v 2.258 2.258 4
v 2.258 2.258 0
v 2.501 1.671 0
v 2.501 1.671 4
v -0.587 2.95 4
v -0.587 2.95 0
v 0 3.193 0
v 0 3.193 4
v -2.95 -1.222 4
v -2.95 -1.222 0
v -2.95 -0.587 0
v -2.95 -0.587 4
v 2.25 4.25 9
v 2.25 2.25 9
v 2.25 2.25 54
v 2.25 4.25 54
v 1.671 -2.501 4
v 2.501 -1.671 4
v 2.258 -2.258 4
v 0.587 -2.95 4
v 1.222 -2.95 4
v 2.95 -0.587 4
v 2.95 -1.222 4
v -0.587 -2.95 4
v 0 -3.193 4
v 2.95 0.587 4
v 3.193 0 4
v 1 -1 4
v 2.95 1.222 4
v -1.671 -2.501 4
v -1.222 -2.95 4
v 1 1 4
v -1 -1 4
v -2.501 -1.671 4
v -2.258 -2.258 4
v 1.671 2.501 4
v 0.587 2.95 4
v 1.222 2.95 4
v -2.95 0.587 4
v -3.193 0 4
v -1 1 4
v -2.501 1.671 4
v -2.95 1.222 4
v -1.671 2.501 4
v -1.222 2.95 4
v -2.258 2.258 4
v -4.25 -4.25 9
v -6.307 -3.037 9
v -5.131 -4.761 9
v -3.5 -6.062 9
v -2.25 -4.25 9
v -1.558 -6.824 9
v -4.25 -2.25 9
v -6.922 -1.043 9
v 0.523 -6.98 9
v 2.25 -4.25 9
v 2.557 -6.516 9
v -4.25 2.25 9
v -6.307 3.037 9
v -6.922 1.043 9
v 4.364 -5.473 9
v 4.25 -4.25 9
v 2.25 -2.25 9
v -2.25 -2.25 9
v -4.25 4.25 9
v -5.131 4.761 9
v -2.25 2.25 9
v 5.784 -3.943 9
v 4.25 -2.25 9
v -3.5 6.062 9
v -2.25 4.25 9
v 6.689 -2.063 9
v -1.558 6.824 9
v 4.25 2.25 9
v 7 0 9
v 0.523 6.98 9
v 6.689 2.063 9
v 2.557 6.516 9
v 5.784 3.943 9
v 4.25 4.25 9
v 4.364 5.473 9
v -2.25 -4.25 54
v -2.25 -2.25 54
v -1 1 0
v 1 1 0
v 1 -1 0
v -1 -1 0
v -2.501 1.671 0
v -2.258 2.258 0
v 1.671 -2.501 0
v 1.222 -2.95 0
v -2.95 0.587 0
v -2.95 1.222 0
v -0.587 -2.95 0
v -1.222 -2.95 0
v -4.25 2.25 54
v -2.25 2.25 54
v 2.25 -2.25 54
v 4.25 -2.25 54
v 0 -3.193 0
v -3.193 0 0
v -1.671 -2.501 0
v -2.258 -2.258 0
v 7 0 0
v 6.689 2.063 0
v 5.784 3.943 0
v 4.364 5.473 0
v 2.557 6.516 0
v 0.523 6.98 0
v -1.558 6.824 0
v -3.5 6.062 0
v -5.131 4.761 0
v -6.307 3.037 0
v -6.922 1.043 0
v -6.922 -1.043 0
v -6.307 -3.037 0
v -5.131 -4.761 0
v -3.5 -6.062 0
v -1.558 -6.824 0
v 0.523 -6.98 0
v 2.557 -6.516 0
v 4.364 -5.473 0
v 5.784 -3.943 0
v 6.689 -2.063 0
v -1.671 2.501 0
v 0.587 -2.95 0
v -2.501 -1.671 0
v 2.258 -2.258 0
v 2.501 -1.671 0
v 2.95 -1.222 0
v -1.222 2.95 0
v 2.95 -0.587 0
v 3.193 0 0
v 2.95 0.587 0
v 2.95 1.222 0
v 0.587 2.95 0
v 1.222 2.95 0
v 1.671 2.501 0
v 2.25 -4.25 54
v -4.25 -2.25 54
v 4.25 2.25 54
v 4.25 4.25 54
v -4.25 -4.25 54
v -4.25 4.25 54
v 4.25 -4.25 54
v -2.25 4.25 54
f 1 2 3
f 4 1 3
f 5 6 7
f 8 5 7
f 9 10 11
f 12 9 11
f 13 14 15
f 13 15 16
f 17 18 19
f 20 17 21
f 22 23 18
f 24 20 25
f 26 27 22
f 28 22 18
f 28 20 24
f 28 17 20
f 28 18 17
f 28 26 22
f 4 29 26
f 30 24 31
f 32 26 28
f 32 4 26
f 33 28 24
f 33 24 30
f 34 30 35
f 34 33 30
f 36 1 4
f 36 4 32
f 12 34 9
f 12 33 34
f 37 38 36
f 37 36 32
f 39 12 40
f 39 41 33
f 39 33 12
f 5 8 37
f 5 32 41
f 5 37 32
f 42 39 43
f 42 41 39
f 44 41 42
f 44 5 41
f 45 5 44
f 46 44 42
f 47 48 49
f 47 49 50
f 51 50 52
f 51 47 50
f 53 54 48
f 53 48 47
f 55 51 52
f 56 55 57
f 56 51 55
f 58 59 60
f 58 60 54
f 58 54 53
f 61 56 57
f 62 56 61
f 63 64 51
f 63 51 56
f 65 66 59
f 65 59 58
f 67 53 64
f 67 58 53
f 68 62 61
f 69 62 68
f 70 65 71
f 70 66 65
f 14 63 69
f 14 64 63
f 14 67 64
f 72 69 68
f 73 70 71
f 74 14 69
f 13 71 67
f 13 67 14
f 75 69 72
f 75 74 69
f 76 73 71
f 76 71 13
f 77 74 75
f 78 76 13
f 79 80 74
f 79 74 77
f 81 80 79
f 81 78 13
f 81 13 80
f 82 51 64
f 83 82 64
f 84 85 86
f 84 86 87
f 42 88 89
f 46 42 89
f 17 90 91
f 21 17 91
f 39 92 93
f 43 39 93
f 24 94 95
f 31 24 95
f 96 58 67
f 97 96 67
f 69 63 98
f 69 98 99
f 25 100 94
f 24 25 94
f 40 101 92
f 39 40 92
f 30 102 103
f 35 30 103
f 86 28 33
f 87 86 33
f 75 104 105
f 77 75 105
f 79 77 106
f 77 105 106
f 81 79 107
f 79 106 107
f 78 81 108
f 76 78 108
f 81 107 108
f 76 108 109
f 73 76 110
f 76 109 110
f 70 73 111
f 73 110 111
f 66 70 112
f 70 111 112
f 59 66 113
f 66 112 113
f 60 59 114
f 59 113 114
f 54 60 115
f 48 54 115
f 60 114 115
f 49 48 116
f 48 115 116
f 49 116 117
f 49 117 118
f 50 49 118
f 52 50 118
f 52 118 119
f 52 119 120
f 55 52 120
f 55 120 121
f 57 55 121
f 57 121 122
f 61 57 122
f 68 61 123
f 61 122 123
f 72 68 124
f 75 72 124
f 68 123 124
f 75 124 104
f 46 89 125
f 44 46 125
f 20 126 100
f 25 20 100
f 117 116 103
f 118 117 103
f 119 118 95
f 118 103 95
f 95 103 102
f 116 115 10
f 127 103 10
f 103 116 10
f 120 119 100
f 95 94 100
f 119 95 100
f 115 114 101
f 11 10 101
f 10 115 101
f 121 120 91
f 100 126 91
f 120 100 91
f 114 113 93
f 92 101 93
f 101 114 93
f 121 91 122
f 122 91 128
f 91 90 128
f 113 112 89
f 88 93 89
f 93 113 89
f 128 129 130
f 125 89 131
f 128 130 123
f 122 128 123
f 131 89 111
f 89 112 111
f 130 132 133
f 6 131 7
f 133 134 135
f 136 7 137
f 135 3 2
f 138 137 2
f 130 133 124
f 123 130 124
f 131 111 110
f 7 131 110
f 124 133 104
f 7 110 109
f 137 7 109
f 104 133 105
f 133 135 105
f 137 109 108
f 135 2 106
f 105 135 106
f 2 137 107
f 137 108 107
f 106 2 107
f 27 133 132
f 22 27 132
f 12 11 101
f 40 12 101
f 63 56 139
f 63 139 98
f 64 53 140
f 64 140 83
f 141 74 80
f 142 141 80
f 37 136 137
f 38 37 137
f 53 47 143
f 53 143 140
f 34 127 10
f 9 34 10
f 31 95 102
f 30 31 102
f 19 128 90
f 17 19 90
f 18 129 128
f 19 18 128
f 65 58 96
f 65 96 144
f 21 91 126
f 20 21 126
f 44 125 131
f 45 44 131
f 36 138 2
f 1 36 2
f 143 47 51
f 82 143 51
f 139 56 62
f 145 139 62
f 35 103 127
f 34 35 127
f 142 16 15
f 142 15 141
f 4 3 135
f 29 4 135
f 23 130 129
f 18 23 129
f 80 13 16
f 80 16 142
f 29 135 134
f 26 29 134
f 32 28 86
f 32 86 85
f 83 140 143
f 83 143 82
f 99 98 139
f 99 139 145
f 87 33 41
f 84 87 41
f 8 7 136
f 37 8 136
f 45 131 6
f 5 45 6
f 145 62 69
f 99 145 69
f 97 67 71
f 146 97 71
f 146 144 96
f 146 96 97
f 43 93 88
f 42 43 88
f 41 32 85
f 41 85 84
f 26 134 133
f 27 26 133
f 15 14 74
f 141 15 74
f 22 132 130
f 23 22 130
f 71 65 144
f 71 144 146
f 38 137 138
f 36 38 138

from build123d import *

# Parameters (mm, degrees)
SKETCH_1_R          = 7
EXTRUDE_1_DEPTH     = 9
SKETCH_2_W          = 2
SKETCH_2_H          = 2
EXTRUDE_2_DEPTH     = 45
CUT_EXTRUDE_1_DEPTH = 4
SKETCH_5_W          = 2
SKETCH_5_H          = 2
EXTRUDE_3_DEPTH     = 4


with BuildPart() as part:
    # 草图1 → 凸台-拉伸1 (new body)
    with BuildSketch(Plane.XY):
        Circle(SKETCH_1_R)
    extrude(amount=EXTRUDE_1_DEPTH)

    # 草图2 → 凸台-拉伸2 (add)
    with BuildSketch(Plane.XY.offset(9)):
        with Locations((3.25, 3.25)):
            Rectangle(SKETCH_2_W, SKETCH_2_H)
        with Locations((-3.25, 3.25)):
            Rectangle(SKETCH_2_W, SKETCH_2_H)
        with Locations((3.25, -3.25)):
            Rectangle(SKETCH_2_W, SKETCH_2_H)
        with Locations((-3.25, -3.25)):
            Rectangle(SKETCH_2_W, SKETCH_2_H)
    extrude(amount=EXTRUDE_2_DEPTH)

    # 草图4 → 切除-拉伸1 (cut)
    with BuildSketch(Plane(origin=(0, 0, 0), x_dir=(-1, 0, 0), z_dir=(0, 0, -1))):
        Polygon((-2.500889242, 1.671040767), (-2.95, 1.221930009), (-2.95, 0.586791484), (-3.193056991, 0), (-2.95, -0.586791484), (-2.95, -1.221930009), (-2.500889242, -1.671040767), (-2.257832251, -2.257832251), (-1.671040767, -2.500889242), (-1.221930009, -2.95), (-0.586791484, -2.95), (0, -3.193056991), (0.586791484, -2.95), (1.221930009, -2.95), (1.671040767, -2.500889242), (2.257832251, -2.257832251), (2.500889242, -1.671040767), (2.95, -1.221930009), (2.95, -0.586791484), (3.193056991, 0), (2.95, 0.586791484), (2.95, 1.221930009), (2.500889242, 1.671040767), (2.257832251, 2.257832251), (1.671040767, 2.500889242), (1.221930009, 2.95), (0.586791484, 2.95), (0, 3.193056991), (-0.586791484, 2.95), (-1.221930009, 2.95), (-1.671040767, 2.500889242), (-2.257832251, 2.257832251), align=None)
    extrude(amount=-CUT_EXTRUDE_1_DEPTH, mode=Mode.SUBTRACT)

    # 草图5 → 凸台-拉伸3 (add)
    with BuildSketch(Plane(origin=(0, 0, 4), x_dir=(-1, 0, 0), z_dir=(0, 0, -1))):
        Rectangle(SKETCH_5_W, SKETCH_5_H)
    extrude(amount=EXTRUDE_3_DEPTH)


solid = part.part
